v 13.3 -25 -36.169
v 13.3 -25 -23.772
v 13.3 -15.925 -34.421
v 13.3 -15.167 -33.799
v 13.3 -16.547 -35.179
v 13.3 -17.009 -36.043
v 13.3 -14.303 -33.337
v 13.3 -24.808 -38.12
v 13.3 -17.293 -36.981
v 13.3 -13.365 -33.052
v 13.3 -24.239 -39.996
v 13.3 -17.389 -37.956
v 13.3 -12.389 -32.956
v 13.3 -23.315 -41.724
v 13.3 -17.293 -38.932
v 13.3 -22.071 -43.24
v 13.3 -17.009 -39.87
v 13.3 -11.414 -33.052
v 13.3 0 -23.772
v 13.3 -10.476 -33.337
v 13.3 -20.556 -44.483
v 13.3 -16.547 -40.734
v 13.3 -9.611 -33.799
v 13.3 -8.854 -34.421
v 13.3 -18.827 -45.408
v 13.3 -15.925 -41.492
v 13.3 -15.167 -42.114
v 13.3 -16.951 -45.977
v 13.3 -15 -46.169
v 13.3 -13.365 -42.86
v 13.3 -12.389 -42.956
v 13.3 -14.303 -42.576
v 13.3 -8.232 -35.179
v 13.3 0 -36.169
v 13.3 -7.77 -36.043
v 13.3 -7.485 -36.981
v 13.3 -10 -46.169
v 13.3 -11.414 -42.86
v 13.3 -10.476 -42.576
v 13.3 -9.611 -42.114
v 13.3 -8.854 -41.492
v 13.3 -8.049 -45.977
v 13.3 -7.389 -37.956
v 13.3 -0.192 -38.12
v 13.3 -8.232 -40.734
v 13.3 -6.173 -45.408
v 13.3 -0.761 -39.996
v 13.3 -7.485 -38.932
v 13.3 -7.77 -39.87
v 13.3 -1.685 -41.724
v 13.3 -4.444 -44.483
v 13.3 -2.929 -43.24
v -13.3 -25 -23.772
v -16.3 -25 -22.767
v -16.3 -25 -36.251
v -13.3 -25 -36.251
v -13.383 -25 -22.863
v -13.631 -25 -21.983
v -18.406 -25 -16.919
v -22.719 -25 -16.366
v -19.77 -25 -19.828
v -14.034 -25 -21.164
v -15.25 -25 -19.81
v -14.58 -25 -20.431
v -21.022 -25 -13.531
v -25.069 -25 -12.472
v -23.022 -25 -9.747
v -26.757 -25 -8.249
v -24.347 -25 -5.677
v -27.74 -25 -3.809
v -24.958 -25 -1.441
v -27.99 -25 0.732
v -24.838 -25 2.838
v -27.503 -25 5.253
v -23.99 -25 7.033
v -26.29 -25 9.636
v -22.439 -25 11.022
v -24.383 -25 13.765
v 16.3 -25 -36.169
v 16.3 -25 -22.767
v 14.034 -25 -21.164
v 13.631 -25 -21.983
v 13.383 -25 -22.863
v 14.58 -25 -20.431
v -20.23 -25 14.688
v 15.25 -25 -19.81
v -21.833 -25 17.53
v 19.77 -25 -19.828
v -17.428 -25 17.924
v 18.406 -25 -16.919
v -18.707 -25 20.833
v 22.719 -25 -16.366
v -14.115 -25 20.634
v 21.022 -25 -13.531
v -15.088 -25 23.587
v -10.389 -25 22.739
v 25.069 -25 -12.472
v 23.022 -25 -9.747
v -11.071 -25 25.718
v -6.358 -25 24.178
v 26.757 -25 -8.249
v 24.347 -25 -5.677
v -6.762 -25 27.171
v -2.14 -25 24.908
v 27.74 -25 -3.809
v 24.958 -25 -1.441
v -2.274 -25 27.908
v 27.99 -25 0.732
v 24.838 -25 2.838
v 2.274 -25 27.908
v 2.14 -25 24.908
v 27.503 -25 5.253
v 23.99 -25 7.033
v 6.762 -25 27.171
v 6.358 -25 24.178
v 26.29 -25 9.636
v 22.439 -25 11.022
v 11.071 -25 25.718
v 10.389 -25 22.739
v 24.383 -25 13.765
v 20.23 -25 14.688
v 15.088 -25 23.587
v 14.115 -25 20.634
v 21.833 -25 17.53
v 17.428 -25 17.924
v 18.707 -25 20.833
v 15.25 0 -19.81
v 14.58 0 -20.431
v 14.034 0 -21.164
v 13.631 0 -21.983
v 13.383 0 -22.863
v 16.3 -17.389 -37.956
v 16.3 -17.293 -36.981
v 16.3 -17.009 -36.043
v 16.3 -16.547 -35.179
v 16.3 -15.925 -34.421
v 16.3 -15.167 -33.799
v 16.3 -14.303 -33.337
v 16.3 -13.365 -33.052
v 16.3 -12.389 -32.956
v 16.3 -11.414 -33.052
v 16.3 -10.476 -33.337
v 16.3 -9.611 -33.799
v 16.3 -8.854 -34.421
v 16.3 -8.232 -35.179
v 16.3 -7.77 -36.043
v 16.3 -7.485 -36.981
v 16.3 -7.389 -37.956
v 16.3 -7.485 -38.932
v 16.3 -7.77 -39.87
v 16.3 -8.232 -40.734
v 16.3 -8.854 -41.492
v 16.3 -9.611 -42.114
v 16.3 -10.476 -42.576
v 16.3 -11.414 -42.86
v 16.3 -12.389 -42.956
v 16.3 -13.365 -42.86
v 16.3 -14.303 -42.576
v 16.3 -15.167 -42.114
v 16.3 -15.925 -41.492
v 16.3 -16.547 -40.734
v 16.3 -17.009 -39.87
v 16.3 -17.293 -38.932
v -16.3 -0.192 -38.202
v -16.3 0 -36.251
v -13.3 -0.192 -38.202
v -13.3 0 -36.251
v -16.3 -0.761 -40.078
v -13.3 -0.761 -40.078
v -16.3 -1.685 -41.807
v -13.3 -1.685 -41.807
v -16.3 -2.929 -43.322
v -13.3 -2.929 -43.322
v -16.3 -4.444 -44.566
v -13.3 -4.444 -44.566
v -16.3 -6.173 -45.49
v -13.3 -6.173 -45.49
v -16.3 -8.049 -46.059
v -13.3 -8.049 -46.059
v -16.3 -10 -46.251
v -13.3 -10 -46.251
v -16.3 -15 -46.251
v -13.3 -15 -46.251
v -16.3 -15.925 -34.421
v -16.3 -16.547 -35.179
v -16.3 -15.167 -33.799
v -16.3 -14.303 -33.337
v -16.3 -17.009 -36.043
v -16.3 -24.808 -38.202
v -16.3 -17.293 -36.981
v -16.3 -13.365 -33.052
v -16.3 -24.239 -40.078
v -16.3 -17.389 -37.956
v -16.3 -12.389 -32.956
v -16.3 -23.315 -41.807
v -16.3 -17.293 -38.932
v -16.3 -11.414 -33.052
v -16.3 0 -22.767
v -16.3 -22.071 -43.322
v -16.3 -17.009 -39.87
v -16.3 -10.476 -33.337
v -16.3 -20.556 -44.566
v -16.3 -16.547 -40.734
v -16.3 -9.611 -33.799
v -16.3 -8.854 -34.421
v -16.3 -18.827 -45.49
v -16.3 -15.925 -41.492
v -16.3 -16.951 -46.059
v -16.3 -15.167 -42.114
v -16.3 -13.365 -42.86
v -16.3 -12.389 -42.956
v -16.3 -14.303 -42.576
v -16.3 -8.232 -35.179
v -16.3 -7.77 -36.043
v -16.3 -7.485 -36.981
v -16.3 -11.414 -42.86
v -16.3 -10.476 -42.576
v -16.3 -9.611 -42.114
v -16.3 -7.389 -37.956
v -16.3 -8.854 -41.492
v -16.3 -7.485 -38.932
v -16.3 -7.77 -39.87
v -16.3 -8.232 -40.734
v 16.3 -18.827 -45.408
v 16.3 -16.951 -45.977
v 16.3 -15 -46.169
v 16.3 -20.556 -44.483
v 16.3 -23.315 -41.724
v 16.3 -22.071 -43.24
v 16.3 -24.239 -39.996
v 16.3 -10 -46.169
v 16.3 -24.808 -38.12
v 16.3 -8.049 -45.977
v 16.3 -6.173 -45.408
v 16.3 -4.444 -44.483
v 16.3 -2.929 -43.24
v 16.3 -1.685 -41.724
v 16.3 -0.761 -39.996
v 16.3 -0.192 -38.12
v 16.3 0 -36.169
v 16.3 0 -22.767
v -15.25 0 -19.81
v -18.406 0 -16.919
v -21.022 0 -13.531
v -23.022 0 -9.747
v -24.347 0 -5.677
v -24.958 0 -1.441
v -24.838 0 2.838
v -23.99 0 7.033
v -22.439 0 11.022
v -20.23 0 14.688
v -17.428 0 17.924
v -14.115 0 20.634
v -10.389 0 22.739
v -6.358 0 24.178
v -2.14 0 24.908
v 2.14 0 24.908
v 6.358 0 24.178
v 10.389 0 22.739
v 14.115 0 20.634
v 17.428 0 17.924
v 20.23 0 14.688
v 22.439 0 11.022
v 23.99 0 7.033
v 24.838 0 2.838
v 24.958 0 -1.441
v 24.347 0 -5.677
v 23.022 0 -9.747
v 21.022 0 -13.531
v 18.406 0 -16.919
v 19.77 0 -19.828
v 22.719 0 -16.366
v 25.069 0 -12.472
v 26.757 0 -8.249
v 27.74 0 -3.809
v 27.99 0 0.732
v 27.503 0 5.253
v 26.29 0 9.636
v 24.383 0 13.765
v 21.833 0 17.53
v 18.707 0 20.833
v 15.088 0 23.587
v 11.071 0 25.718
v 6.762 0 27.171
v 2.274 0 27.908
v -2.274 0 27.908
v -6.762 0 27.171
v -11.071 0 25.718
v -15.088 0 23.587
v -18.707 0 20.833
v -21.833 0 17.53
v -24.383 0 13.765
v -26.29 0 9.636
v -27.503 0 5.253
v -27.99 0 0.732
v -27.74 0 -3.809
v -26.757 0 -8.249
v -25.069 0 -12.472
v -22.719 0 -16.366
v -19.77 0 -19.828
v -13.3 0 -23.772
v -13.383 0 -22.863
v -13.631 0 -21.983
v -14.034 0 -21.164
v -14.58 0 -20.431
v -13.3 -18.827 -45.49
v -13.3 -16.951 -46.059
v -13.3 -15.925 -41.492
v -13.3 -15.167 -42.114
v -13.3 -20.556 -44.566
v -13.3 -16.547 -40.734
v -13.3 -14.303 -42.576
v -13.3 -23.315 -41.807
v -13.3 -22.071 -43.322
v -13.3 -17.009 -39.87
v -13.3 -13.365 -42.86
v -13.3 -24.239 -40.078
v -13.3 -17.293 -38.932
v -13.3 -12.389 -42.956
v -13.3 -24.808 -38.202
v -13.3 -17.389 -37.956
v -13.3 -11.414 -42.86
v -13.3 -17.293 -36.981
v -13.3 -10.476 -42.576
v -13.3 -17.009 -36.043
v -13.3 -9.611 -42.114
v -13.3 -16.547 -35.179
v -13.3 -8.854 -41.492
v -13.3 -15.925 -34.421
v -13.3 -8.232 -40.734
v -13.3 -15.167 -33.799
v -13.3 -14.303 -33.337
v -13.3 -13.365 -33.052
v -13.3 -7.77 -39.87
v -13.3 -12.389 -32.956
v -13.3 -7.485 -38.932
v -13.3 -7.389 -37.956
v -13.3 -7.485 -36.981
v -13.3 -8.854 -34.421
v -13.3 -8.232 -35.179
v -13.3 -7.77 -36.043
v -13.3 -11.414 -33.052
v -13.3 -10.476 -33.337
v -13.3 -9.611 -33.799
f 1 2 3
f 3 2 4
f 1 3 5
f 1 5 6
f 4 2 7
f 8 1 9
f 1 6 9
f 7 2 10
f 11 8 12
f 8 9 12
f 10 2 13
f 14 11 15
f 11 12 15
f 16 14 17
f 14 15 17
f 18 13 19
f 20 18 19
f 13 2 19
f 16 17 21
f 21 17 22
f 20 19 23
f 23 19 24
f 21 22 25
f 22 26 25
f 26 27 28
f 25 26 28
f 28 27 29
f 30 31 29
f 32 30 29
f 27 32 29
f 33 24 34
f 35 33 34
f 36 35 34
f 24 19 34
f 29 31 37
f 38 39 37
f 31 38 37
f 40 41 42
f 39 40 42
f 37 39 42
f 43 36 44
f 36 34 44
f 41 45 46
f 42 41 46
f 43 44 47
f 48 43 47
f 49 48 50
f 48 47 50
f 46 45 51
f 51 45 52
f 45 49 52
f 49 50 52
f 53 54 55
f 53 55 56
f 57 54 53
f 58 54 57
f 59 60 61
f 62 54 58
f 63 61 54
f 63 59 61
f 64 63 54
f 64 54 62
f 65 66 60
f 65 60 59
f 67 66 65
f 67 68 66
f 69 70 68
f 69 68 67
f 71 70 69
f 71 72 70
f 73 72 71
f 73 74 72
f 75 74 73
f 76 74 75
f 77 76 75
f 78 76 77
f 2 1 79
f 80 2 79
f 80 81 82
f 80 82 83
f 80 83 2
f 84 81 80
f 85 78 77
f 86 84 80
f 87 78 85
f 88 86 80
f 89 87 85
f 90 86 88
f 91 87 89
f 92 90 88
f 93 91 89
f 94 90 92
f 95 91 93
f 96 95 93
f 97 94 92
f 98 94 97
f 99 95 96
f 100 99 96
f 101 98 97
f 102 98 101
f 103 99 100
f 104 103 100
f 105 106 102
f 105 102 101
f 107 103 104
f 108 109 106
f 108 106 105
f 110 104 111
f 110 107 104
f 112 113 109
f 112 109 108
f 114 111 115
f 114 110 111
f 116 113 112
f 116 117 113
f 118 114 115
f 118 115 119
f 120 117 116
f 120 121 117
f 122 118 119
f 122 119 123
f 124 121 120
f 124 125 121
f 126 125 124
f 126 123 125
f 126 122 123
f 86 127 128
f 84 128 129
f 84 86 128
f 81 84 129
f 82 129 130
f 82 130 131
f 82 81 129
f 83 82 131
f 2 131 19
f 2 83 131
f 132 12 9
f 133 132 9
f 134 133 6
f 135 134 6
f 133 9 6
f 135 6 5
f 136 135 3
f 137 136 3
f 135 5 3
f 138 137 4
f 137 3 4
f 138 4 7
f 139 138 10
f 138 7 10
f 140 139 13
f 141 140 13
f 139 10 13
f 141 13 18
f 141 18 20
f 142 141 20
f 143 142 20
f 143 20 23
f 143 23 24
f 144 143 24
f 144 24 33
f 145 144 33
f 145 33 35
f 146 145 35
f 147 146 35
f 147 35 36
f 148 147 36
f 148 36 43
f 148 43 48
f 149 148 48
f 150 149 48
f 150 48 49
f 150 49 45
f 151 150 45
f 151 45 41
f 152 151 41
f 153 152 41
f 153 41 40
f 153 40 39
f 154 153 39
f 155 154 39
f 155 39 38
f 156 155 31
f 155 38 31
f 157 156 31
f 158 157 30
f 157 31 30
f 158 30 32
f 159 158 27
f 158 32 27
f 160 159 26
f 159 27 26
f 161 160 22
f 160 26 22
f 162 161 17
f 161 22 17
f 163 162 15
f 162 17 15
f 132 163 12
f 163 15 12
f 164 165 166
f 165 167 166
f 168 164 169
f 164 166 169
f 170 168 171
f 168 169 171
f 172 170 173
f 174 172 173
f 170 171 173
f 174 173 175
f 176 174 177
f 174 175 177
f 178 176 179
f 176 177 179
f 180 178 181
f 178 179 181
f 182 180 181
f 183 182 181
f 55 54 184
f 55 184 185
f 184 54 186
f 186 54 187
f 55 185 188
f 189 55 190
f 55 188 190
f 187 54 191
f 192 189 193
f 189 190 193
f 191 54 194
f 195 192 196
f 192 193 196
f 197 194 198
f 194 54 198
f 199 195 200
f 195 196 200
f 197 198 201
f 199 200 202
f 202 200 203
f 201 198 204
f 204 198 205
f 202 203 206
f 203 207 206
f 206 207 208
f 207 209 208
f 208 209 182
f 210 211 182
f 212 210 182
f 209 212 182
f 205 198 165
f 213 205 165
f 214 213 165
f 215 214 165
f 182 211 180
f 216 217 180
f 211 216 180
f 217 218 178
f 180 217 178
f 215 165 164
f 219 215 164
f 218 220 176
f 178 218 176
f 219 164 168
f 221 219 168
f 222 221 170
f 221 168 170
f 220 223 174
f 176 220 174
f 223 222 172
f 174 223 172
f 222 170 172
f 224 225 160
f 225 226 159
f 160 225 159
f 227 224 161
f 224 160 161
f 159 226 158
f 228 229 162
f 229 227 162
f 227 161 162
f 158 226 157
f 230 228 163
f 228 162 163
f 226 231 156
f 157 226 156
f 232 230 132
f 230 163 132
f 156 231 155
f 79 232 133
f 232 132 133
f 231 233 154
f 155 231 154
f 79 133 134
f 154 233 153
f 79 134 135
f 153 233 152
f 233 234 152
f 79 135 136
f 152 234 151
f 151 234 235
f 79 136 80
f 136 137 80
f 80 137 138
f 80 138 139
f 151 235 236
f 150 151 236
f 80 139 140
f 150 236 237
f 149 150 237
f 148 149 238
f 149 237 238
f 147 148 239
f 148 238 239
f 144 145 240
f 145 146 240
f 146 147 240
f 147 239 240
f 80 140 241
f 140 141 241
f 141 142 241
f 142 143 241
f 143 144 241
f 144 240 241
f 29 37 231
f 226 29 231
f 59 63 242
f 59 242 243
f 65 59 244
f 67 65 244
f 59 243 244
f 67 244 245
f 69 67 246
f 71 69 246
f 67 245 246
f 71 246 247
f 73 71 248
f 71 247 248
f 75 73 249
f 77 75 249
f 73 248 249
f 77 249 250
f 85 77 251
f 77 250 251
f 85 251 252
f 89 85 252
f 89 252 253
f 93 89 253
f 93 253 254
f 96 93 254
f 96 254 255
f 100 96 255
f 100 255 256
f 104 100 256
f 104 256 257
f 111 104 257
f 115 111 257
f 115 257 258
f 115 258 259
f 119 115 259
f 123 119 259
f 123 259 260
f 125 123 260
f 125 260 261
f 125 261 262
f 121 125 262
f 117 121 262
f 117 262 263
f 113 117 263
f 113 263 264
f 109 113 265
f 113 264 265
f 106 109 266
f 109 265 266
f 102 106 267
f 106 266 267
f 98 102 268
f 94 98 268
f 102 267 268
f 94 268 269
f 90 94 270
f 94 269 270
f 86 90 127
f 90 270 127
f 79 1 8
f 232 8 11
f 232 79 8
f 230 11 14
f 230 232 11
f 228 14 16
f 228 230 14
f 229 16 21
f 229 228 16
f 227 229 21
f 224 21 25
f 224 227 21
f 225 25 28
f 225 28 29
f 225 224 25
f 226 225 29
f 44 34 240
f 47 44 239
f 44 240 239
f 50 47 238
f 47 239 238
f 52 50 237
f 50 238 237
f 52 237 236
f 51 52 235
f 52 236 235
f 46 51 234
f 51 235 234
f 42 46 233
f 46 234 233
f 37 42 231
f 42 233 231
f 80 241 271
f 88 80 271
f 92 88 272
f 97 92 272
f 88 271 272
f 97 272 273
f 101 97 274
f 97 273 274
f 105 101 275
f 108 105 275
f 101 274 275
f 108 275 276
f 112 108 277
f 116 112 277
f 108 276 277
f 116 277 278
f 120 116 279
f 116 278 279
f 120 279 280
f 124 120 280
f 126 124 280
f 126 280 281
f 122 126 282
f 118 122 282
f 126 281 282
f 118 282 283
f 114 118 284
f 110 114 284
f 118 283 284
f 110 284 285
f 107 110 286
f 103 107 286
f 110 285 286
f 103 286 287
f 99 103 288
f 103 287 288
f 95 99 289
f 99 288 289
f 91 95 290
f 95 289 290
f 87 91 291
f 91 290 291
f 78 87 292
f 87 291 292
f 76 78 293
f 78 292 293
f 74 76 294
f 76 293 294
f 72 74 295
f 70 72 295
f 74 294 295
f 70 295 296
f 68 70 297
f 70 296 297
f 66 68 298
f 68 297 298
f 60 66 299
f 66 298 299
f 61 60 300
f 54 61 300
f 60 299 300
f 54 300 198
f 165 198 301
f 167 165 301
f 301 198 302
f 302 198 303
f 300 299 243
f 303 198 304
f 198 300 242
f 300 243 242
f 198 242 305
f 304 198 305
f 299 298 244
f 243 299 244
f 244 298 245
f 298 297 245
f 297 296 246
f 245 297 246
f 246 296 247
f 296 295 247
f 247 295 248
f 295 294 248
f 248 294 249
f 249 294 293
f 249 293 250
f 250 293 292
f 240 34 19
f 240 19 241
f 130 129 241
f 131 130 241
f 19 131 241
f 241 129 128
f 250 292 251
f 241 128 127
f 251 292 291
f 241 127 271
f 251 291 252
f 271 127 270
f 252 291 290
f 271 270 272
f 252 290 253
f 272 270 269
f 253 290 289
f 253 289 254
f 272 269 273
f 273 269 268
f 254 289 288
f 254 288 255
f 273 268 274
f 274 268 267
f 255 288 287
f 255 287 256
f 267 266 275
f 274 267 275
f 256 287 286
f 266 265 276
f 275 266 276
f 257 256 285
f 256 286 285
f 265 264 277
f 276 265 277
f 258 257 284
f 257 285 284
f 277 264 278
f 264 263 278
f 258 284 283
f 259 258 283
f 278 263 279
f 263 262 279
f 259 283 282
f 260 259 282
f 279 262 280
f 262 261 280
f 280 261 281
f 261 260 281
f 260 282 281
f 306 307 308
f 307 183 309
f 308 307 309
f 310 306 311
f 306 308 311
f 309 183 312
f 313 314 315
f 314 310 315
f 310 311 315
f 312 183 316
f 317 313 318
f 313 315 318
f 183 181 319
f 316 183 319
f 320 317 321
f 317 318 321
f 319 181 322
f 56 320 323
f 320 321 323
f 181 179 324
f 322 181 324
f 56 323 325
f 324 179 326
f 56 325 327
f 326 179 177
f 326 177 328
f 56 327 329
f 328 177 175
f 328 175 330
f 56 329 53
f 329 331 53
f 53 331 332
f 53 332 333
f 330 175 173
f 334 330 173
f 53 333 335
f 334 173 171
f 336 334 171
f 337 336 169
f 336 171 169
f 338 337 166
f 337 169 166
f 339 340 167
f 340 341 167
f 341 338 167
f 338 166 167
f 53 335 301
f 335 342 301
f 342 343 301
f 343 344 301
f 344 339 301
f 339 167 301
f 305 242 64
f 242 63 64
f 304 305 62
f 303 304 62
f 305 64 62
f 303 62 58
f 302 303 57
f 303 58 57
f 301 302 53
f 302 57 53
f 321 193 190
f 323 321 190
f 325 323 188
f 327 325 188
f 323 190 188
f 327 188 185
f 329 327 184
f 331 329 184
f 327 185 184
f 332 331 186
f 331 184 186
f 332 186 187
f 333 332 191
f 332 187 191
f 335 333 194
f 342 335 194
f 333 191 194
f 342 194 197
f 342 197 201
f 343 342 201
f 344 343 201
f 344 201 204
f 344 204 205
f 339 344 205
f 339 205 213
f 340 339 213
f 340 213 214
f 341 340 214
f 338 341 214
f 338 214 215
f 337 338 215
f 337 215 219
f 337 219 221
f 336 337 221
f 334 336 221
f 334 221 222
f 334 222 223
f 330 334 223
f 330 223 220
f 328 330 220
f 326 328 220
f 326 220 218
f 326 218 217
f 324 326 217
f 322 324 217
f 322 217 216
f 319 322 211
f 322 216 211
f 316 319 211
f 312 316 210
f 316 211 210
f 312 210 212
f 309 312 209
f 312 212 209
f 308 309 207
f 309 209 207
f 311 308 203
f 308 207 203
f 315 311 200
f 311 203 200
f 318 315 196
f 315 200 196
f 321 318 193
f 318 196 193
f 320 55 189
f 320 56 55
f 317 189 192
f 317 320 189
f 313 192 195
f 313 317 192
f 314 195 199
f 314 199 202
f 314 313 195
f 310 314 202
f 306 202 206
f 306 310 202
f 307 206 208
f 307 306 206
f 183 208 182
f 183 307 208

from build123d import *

# Parameters (mm, degrees)
F1_DEPTH = 25
F2_R     = 5
F3_R     = 5
F4_DEPTH = 42.9
F5_R     = 10


# Not quite as in the source:
# - a feature names something its author has since deleted; it is built from what else it names


with BuildPart() as f1:
    # F0 (on Front) → F1 (new body)
    with BuildSketch(Plane.XZ):
        with BuildLine():
            ThreePointArc((-13.2998284399, -21.1687166231), (0, 25), (13.2998284399, -21.1687166231))
            Line((13.2998284399, -21.1687166231), (13.2998284399, -46.1687166231))
            Line((13.2998284399, -46.1687166231), (16.2998284399, -46.1687166231))
            Line((16.2998284399, -46.1687166231), (16.2998284399, -22.7665454742))
            ThreePointArc((16.2998284399, -22.7665454742), (0, 28), (-16.2998284399, -22.7665454742))
            Line((-16.2998284399, -22.7665454742), (-16.2998284399, -46.2509857135))
            Line((-16.2998284399, -46.2509857135), (-13.2998284399, -46.2509857135))
            Line((-13.2998284399, -46.2509857135), (-13.2998284399, -21.1687166231))
        make_face()
    extrude(amount=F1_DEPTH)

    # F2
    f2_edges = [f1.edges().sort_by_distance(p)[0] for p in [
        (13.299828, -12.5, -21.168717),
        (-13.299828, -12.5, -21.168717),
    ]]
    fillet(f2_edges, radius=F2_R)

    # F3 (on face) → F4 (cut)
    with BuildSketch(Plane(origin=(-16.2998284399, 0, 0), x_dir=(0, -1, 0), z_dir=(-1, 0, 0))):
        with Locations((12.3893171549, -37.9563570023)):
            Circle(F3_R)
    extrude(amount=-F4_DEPTH, mode=Mode.SUBTRACT)

    # F5
    f5_edges = [f1.edges().sort_by_distance(p)[0] for p in [
        (-14.799828, 0, -46.250986),
        (-14.799828, -25, -46.250986),
        (14.799828, -25, -46.168717),
        (14.799828, 0, -46.168717),
    ]]
    fillet(f5_edges, radius=F5_R)


solid = f1.part
